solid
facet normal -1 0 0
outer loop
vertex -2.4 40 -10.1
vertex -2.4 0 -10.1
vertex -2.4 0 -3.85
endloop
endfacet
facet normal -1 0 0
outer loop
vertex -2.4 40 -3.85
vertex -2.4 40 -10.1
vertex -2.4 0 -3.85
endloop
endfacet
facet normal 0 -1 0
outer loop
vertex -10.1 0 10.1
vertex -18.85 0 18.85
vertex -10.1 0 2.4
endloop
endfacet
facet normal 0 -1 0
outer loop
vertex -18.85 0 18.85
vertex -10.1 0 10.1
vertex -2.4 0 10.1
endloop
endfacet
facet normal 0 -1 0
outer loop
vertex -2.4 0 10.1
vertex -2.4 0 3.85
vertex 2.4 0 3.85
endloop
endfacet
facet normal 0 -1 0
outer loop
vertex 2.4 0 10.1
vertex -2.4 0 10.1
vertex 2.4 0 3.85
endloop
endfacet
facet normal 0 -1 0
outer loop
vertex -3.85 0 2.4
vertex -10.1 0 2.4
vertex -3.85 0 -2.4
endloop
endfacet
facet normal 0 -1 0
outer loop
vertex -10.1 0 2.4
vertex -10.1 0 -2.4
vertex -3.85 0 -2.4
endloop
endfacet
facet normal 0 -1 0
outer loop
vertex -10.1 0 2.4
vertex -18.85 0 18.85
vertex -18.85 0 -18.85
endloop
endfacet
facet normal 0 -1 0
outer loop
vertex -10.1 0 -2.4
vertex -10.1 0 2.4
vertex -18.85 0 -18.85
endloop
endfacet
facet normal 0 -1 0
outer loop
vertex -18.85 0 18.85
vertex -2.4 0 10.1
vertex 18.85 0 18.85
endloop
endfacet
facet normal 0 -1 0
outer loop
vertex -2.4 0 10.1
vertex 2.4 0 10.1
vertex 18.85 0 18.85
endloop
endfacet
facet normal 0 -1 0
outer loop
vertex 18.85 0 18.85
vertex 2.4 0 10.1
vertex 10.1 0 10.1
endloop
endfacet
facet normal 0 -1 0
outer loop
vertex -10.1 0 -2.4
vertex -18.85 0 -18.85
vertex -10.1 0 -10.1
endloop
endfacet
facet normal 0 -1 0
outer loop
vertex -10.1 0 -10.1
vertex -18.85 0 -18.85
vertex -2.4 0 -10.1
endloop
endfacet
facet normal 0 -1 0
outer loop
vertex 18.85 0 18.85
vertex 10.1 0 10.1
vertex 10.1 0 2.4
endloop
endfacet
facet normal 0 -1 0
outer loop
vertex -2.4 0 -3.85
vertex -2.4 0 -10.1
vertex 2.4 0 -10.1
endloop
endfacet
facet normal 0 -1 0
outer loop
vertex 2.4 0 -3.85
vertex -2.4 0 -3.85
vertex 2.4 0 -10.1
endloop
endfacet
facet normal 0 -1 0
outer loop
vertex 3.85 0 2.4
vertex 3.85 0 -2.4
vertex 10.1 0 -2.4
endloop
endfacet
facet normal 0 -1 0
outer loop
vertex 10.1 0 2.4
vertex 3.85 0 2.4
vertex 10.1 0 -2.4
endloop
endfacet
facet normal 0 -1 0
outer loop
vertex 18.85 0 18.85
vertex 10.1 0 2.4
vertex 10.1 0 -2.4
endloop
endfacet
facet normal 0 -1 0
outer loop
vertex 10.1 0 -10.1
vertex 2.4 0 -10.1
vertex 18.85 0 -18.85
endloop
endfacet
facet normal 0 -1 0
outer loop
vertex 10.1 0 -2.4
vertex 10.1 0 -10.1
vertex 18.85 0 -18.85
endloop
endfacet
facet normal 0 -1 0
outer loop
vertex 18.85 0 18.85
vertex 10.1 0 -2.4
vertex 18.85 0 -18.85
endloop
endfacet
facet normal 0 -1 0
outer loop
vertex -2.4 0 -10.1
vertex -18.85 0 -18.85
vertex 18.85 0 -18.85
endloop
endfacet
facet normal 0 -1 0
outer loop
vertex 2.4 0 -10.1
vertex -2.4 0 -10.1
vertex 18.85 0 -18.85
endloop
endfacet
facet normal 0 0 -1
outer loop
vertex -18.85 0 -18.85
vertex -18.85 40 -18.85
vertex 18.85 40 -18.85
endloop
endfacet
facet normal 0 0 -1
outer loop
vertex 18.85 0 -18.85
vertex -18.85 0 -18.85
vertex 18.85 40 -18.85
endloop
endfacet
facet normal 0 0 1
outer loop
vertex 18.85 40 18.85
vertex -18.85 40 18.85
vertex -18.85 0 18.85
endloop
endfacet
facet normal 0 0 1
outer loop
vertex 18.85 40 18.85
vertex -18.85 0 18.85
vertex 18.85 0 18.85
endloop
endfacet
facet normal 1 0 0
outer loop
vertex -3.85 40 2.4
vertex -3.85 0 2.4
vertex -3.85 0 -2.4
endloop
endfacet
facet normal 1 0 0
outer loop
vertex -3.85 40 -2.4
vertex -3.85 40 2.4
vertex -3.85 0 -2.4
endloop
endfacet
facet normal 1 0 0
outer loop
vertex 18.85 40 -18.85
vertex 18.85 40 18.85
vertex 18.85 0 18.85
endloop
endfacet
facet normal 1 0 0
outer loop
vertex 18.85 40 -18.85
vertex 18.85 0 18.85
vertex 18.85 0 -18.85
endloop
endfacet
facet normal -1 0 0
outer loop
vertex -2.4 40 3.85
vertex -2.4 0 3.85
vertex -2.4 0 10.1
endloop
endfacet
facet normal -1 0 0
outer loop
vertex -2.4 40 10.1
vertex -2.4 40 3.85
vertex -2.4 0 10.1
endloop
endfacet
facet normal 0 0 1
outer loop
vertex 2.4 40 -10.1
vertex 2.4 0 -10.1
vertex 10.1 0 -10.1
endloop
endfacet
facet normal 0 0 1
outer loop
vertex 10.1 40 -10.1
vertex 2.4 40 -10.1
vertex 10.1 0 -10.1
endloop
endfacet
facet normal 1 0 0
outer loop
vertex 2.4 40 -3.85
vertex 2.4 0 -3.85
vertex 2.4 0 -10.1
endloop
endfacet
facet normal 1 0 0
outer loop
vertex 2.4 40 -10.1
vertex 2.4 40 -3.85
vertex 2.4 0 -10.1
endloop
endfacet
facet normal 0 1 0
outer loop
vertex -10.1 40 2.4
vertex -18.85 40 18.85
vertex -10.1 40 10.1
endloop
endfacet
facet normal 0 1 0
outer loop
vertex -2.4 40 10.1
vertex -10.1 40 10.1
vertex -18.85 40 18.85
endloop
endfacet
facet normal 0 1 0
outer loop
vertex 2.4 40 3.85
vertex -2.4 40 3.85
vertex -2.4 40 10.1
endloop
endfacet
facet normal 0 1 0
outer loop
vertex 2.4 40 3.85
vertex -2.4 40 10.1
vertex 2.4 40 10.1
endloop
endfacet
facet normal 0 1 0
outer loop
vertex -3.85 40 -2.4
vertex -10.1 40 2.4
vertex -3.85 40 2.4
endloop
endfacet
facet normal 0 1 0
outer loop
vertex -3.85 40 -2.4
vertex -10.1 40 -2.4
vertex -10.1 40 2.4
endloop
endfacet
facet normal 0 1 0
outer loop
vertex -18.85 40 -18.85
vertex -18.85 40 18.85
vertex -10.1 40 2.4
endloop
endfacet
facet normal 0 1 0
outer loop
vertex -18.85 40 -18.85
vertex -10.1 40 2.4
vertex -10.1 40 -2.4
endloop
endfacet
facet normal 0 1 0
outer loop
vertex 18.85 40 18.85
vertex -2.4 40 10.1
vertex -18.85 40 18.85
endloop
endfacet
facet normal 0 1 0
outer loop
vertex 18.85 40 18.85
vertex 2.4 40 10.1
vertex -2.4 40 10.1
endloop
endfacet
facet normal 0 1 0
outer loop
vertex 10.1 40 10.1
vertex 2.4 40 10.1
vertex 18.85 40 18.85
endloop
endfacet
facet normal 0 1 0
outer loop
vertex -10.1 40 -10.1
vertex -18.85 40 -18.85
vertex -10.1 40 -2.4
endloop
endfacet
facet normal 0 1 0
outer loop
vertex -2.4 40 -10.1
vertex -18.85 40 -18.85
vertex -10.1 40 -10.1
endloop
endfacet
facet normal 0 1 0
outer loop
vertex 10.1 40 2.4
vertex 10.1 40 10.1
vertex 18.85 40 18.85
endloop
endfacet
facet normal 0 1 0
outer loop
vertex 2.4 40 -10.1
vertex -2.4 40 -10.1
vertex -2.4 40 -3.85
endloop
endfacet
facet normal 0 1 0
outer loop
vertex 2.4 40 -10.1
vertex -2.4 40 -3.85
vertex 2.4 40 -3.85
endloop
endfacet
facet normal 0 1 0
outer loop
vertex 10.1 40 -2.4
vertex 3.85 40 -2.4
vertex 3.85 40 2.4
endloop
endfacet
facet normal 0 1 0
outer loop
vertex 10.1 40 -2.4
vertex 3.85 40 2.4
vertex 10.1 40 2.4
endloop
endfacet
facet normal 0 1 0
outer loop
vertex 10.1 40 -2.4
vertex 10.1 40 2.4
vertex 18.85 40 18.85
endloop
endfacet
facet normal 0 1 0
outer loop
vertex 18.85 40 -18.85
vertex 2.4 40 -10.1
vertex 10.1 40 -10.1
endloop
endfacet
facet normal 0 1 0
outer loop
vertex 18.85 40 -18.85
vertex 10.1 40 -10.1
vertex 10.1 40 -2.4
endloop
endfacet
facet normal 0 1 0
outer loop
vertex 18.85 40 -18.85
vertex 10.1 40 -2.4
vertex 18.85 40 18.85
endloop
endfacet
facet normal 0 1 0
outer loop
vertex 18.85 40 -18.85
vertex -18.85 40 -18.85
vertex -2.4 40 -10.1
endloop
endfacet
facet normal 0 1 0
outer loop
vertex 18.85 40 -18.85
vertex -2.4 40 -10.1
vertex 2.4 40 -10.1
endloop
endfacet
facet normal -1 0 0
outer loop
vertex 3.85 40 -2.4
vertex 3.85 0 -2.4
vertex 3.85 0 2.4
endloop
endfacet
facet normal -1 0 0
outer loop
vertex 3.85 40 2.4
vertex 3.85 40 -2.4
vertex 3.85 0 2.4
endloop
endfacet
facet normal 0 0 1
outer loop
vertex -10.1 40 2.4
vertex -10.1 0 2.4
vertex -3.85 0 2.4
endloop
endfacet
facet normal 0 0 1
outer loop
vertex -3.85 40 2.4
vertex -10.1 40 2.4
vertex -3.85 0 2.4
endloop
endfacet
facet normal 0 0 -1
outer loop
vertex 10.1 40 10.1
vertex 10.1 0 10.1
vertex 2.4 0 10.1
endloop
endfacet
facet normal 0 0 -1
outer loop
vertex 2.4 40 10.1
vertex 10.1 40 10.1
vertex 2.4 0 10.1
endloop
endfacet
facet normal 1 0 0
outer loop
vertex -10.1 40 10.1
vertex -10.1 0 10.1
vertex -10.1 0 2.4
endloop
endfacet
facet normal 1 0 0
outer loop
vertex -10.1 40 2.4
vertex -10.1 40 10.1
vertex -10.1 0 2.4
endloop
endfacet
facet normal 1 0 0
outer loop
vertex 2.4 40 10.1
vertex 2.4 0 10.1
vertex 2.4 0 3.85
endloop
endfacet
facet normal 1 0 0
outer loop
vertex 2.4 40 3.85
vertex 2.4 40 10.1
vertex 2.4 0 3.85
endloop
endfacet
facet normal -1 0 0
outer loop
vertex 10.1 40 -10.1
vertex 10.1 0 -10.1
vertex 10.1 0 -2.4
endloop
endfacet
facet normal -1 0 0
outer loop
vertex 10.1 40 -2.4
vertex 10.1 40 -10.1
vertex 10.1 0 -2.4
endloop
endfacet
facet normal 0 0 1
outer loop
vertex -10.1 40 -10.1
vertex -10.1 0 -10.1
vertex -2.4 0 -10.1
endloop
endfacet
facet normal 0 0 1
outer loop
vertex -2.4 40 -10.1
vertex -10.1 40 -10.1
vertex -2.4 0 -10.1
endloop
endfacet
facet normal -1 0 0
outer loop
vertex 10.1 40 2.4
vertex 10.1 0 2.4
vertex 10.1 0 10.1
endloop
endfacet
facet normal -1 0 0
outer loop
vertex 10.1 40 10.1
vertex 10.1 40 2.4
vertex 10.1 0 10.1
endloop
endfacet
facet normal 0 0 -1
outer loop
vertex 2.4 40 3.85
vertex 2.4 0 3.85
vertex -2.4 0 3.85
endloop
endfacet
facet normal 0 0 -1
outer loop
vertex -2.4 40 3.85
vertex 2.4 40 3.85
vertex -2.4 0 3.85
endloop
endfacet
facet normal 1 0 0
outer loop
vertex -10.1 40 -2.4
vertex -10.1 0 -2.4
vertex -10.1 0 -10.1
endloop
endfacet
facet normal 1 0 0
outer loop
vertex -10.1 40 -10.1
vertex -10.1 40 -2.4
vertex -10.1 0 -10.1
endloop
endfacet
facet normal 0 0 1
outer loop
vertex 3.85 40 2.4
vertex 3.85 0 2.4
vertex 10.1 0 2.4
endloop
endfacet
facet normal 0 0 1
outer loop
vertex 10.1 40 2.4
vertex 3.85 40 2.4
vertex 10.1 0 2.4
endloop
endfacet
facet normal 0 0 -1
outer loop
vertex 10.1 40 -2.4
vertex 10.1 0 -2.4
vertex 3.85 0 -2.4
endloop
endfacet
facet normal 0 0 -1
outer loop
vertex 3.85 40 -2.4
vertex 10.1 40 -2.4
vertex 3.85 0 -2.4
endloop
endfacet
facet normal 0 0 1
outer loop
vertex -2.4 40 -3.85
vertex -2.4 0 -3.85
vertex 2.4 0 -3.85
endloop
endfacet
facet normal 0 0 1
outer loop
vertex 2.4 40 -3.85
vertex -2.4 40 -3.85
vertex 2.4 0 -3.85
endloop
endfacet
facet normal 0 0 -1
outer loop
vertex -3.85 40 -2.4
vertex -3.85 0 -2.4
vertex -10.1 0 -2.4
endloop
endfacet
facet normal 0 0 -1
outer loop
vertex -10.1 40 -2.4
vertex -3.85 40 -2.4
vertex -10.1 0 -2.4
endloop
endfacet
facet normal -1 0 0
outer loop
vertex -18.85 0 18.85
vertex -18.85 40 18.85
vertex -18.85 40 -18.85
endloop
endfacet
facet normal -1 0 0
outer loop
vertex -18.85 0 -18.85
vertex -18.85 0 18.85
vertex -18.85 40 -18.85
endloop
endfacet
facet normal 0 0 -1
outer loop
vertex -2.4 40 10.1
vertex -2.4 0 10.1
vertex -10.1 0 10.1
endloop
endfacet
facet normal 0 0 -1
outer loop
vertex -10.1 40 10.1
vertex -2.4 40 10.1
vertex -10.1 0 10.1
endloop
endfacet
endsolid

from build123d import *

# Parameters (mm, degrees)
ESQUISSE1_W        = 37.7
ESQUISSE1_H        = 37.7
BOSS_EXTRU_1_DEPTH = 40


with BuildPart() as part:
    # Esquisse1 → Boss.-Extru.1 (new body)
    with BuildSketch(Plane(origin=(0, 0, 0), x_dir=(1, 0, 0), z_dir=(0, 1, 0))):
        Rectangle(ESQUISSE1_W, ESQUISSE1_H)
        Polygon((-10.1, 10.1), (-2.4, 10.1), (-2.4, 3.85), (2.4, 3.85), (2.4, 10.1), (10.1, 10.1), (10.1, 2.4), (3.85, 2.4), (3.85, -2.4), (10.1, -2.4), (10.1, -10.1), (2.4, -10.1), (2.4, -3.85), (-2.4, -3.85), (-2.4, -10.1), (-10.1, -10.1), (-10.1, -2.4), (-3.85, -2.4), (-3.85, 2.4), (-10.1, 2.4), align=None, mode=Mode.SUBTRACT)
    boss_extru_1 = extrude(amount=BOSS_EXTRU_1_DEPTH)


with BuildPart() as sym_trie1_1:
    # Symétrie1: Boss.-Extru.1 across plane
    add(boss_extru_1.mirror(Plane.XY))


with BuildPart() as part_1:
    add(part.part)

    # Symétrie1 united with what the copies to: union Symétrie1_1
    add(sym_trie1_1.part)


solid = part_1.part
